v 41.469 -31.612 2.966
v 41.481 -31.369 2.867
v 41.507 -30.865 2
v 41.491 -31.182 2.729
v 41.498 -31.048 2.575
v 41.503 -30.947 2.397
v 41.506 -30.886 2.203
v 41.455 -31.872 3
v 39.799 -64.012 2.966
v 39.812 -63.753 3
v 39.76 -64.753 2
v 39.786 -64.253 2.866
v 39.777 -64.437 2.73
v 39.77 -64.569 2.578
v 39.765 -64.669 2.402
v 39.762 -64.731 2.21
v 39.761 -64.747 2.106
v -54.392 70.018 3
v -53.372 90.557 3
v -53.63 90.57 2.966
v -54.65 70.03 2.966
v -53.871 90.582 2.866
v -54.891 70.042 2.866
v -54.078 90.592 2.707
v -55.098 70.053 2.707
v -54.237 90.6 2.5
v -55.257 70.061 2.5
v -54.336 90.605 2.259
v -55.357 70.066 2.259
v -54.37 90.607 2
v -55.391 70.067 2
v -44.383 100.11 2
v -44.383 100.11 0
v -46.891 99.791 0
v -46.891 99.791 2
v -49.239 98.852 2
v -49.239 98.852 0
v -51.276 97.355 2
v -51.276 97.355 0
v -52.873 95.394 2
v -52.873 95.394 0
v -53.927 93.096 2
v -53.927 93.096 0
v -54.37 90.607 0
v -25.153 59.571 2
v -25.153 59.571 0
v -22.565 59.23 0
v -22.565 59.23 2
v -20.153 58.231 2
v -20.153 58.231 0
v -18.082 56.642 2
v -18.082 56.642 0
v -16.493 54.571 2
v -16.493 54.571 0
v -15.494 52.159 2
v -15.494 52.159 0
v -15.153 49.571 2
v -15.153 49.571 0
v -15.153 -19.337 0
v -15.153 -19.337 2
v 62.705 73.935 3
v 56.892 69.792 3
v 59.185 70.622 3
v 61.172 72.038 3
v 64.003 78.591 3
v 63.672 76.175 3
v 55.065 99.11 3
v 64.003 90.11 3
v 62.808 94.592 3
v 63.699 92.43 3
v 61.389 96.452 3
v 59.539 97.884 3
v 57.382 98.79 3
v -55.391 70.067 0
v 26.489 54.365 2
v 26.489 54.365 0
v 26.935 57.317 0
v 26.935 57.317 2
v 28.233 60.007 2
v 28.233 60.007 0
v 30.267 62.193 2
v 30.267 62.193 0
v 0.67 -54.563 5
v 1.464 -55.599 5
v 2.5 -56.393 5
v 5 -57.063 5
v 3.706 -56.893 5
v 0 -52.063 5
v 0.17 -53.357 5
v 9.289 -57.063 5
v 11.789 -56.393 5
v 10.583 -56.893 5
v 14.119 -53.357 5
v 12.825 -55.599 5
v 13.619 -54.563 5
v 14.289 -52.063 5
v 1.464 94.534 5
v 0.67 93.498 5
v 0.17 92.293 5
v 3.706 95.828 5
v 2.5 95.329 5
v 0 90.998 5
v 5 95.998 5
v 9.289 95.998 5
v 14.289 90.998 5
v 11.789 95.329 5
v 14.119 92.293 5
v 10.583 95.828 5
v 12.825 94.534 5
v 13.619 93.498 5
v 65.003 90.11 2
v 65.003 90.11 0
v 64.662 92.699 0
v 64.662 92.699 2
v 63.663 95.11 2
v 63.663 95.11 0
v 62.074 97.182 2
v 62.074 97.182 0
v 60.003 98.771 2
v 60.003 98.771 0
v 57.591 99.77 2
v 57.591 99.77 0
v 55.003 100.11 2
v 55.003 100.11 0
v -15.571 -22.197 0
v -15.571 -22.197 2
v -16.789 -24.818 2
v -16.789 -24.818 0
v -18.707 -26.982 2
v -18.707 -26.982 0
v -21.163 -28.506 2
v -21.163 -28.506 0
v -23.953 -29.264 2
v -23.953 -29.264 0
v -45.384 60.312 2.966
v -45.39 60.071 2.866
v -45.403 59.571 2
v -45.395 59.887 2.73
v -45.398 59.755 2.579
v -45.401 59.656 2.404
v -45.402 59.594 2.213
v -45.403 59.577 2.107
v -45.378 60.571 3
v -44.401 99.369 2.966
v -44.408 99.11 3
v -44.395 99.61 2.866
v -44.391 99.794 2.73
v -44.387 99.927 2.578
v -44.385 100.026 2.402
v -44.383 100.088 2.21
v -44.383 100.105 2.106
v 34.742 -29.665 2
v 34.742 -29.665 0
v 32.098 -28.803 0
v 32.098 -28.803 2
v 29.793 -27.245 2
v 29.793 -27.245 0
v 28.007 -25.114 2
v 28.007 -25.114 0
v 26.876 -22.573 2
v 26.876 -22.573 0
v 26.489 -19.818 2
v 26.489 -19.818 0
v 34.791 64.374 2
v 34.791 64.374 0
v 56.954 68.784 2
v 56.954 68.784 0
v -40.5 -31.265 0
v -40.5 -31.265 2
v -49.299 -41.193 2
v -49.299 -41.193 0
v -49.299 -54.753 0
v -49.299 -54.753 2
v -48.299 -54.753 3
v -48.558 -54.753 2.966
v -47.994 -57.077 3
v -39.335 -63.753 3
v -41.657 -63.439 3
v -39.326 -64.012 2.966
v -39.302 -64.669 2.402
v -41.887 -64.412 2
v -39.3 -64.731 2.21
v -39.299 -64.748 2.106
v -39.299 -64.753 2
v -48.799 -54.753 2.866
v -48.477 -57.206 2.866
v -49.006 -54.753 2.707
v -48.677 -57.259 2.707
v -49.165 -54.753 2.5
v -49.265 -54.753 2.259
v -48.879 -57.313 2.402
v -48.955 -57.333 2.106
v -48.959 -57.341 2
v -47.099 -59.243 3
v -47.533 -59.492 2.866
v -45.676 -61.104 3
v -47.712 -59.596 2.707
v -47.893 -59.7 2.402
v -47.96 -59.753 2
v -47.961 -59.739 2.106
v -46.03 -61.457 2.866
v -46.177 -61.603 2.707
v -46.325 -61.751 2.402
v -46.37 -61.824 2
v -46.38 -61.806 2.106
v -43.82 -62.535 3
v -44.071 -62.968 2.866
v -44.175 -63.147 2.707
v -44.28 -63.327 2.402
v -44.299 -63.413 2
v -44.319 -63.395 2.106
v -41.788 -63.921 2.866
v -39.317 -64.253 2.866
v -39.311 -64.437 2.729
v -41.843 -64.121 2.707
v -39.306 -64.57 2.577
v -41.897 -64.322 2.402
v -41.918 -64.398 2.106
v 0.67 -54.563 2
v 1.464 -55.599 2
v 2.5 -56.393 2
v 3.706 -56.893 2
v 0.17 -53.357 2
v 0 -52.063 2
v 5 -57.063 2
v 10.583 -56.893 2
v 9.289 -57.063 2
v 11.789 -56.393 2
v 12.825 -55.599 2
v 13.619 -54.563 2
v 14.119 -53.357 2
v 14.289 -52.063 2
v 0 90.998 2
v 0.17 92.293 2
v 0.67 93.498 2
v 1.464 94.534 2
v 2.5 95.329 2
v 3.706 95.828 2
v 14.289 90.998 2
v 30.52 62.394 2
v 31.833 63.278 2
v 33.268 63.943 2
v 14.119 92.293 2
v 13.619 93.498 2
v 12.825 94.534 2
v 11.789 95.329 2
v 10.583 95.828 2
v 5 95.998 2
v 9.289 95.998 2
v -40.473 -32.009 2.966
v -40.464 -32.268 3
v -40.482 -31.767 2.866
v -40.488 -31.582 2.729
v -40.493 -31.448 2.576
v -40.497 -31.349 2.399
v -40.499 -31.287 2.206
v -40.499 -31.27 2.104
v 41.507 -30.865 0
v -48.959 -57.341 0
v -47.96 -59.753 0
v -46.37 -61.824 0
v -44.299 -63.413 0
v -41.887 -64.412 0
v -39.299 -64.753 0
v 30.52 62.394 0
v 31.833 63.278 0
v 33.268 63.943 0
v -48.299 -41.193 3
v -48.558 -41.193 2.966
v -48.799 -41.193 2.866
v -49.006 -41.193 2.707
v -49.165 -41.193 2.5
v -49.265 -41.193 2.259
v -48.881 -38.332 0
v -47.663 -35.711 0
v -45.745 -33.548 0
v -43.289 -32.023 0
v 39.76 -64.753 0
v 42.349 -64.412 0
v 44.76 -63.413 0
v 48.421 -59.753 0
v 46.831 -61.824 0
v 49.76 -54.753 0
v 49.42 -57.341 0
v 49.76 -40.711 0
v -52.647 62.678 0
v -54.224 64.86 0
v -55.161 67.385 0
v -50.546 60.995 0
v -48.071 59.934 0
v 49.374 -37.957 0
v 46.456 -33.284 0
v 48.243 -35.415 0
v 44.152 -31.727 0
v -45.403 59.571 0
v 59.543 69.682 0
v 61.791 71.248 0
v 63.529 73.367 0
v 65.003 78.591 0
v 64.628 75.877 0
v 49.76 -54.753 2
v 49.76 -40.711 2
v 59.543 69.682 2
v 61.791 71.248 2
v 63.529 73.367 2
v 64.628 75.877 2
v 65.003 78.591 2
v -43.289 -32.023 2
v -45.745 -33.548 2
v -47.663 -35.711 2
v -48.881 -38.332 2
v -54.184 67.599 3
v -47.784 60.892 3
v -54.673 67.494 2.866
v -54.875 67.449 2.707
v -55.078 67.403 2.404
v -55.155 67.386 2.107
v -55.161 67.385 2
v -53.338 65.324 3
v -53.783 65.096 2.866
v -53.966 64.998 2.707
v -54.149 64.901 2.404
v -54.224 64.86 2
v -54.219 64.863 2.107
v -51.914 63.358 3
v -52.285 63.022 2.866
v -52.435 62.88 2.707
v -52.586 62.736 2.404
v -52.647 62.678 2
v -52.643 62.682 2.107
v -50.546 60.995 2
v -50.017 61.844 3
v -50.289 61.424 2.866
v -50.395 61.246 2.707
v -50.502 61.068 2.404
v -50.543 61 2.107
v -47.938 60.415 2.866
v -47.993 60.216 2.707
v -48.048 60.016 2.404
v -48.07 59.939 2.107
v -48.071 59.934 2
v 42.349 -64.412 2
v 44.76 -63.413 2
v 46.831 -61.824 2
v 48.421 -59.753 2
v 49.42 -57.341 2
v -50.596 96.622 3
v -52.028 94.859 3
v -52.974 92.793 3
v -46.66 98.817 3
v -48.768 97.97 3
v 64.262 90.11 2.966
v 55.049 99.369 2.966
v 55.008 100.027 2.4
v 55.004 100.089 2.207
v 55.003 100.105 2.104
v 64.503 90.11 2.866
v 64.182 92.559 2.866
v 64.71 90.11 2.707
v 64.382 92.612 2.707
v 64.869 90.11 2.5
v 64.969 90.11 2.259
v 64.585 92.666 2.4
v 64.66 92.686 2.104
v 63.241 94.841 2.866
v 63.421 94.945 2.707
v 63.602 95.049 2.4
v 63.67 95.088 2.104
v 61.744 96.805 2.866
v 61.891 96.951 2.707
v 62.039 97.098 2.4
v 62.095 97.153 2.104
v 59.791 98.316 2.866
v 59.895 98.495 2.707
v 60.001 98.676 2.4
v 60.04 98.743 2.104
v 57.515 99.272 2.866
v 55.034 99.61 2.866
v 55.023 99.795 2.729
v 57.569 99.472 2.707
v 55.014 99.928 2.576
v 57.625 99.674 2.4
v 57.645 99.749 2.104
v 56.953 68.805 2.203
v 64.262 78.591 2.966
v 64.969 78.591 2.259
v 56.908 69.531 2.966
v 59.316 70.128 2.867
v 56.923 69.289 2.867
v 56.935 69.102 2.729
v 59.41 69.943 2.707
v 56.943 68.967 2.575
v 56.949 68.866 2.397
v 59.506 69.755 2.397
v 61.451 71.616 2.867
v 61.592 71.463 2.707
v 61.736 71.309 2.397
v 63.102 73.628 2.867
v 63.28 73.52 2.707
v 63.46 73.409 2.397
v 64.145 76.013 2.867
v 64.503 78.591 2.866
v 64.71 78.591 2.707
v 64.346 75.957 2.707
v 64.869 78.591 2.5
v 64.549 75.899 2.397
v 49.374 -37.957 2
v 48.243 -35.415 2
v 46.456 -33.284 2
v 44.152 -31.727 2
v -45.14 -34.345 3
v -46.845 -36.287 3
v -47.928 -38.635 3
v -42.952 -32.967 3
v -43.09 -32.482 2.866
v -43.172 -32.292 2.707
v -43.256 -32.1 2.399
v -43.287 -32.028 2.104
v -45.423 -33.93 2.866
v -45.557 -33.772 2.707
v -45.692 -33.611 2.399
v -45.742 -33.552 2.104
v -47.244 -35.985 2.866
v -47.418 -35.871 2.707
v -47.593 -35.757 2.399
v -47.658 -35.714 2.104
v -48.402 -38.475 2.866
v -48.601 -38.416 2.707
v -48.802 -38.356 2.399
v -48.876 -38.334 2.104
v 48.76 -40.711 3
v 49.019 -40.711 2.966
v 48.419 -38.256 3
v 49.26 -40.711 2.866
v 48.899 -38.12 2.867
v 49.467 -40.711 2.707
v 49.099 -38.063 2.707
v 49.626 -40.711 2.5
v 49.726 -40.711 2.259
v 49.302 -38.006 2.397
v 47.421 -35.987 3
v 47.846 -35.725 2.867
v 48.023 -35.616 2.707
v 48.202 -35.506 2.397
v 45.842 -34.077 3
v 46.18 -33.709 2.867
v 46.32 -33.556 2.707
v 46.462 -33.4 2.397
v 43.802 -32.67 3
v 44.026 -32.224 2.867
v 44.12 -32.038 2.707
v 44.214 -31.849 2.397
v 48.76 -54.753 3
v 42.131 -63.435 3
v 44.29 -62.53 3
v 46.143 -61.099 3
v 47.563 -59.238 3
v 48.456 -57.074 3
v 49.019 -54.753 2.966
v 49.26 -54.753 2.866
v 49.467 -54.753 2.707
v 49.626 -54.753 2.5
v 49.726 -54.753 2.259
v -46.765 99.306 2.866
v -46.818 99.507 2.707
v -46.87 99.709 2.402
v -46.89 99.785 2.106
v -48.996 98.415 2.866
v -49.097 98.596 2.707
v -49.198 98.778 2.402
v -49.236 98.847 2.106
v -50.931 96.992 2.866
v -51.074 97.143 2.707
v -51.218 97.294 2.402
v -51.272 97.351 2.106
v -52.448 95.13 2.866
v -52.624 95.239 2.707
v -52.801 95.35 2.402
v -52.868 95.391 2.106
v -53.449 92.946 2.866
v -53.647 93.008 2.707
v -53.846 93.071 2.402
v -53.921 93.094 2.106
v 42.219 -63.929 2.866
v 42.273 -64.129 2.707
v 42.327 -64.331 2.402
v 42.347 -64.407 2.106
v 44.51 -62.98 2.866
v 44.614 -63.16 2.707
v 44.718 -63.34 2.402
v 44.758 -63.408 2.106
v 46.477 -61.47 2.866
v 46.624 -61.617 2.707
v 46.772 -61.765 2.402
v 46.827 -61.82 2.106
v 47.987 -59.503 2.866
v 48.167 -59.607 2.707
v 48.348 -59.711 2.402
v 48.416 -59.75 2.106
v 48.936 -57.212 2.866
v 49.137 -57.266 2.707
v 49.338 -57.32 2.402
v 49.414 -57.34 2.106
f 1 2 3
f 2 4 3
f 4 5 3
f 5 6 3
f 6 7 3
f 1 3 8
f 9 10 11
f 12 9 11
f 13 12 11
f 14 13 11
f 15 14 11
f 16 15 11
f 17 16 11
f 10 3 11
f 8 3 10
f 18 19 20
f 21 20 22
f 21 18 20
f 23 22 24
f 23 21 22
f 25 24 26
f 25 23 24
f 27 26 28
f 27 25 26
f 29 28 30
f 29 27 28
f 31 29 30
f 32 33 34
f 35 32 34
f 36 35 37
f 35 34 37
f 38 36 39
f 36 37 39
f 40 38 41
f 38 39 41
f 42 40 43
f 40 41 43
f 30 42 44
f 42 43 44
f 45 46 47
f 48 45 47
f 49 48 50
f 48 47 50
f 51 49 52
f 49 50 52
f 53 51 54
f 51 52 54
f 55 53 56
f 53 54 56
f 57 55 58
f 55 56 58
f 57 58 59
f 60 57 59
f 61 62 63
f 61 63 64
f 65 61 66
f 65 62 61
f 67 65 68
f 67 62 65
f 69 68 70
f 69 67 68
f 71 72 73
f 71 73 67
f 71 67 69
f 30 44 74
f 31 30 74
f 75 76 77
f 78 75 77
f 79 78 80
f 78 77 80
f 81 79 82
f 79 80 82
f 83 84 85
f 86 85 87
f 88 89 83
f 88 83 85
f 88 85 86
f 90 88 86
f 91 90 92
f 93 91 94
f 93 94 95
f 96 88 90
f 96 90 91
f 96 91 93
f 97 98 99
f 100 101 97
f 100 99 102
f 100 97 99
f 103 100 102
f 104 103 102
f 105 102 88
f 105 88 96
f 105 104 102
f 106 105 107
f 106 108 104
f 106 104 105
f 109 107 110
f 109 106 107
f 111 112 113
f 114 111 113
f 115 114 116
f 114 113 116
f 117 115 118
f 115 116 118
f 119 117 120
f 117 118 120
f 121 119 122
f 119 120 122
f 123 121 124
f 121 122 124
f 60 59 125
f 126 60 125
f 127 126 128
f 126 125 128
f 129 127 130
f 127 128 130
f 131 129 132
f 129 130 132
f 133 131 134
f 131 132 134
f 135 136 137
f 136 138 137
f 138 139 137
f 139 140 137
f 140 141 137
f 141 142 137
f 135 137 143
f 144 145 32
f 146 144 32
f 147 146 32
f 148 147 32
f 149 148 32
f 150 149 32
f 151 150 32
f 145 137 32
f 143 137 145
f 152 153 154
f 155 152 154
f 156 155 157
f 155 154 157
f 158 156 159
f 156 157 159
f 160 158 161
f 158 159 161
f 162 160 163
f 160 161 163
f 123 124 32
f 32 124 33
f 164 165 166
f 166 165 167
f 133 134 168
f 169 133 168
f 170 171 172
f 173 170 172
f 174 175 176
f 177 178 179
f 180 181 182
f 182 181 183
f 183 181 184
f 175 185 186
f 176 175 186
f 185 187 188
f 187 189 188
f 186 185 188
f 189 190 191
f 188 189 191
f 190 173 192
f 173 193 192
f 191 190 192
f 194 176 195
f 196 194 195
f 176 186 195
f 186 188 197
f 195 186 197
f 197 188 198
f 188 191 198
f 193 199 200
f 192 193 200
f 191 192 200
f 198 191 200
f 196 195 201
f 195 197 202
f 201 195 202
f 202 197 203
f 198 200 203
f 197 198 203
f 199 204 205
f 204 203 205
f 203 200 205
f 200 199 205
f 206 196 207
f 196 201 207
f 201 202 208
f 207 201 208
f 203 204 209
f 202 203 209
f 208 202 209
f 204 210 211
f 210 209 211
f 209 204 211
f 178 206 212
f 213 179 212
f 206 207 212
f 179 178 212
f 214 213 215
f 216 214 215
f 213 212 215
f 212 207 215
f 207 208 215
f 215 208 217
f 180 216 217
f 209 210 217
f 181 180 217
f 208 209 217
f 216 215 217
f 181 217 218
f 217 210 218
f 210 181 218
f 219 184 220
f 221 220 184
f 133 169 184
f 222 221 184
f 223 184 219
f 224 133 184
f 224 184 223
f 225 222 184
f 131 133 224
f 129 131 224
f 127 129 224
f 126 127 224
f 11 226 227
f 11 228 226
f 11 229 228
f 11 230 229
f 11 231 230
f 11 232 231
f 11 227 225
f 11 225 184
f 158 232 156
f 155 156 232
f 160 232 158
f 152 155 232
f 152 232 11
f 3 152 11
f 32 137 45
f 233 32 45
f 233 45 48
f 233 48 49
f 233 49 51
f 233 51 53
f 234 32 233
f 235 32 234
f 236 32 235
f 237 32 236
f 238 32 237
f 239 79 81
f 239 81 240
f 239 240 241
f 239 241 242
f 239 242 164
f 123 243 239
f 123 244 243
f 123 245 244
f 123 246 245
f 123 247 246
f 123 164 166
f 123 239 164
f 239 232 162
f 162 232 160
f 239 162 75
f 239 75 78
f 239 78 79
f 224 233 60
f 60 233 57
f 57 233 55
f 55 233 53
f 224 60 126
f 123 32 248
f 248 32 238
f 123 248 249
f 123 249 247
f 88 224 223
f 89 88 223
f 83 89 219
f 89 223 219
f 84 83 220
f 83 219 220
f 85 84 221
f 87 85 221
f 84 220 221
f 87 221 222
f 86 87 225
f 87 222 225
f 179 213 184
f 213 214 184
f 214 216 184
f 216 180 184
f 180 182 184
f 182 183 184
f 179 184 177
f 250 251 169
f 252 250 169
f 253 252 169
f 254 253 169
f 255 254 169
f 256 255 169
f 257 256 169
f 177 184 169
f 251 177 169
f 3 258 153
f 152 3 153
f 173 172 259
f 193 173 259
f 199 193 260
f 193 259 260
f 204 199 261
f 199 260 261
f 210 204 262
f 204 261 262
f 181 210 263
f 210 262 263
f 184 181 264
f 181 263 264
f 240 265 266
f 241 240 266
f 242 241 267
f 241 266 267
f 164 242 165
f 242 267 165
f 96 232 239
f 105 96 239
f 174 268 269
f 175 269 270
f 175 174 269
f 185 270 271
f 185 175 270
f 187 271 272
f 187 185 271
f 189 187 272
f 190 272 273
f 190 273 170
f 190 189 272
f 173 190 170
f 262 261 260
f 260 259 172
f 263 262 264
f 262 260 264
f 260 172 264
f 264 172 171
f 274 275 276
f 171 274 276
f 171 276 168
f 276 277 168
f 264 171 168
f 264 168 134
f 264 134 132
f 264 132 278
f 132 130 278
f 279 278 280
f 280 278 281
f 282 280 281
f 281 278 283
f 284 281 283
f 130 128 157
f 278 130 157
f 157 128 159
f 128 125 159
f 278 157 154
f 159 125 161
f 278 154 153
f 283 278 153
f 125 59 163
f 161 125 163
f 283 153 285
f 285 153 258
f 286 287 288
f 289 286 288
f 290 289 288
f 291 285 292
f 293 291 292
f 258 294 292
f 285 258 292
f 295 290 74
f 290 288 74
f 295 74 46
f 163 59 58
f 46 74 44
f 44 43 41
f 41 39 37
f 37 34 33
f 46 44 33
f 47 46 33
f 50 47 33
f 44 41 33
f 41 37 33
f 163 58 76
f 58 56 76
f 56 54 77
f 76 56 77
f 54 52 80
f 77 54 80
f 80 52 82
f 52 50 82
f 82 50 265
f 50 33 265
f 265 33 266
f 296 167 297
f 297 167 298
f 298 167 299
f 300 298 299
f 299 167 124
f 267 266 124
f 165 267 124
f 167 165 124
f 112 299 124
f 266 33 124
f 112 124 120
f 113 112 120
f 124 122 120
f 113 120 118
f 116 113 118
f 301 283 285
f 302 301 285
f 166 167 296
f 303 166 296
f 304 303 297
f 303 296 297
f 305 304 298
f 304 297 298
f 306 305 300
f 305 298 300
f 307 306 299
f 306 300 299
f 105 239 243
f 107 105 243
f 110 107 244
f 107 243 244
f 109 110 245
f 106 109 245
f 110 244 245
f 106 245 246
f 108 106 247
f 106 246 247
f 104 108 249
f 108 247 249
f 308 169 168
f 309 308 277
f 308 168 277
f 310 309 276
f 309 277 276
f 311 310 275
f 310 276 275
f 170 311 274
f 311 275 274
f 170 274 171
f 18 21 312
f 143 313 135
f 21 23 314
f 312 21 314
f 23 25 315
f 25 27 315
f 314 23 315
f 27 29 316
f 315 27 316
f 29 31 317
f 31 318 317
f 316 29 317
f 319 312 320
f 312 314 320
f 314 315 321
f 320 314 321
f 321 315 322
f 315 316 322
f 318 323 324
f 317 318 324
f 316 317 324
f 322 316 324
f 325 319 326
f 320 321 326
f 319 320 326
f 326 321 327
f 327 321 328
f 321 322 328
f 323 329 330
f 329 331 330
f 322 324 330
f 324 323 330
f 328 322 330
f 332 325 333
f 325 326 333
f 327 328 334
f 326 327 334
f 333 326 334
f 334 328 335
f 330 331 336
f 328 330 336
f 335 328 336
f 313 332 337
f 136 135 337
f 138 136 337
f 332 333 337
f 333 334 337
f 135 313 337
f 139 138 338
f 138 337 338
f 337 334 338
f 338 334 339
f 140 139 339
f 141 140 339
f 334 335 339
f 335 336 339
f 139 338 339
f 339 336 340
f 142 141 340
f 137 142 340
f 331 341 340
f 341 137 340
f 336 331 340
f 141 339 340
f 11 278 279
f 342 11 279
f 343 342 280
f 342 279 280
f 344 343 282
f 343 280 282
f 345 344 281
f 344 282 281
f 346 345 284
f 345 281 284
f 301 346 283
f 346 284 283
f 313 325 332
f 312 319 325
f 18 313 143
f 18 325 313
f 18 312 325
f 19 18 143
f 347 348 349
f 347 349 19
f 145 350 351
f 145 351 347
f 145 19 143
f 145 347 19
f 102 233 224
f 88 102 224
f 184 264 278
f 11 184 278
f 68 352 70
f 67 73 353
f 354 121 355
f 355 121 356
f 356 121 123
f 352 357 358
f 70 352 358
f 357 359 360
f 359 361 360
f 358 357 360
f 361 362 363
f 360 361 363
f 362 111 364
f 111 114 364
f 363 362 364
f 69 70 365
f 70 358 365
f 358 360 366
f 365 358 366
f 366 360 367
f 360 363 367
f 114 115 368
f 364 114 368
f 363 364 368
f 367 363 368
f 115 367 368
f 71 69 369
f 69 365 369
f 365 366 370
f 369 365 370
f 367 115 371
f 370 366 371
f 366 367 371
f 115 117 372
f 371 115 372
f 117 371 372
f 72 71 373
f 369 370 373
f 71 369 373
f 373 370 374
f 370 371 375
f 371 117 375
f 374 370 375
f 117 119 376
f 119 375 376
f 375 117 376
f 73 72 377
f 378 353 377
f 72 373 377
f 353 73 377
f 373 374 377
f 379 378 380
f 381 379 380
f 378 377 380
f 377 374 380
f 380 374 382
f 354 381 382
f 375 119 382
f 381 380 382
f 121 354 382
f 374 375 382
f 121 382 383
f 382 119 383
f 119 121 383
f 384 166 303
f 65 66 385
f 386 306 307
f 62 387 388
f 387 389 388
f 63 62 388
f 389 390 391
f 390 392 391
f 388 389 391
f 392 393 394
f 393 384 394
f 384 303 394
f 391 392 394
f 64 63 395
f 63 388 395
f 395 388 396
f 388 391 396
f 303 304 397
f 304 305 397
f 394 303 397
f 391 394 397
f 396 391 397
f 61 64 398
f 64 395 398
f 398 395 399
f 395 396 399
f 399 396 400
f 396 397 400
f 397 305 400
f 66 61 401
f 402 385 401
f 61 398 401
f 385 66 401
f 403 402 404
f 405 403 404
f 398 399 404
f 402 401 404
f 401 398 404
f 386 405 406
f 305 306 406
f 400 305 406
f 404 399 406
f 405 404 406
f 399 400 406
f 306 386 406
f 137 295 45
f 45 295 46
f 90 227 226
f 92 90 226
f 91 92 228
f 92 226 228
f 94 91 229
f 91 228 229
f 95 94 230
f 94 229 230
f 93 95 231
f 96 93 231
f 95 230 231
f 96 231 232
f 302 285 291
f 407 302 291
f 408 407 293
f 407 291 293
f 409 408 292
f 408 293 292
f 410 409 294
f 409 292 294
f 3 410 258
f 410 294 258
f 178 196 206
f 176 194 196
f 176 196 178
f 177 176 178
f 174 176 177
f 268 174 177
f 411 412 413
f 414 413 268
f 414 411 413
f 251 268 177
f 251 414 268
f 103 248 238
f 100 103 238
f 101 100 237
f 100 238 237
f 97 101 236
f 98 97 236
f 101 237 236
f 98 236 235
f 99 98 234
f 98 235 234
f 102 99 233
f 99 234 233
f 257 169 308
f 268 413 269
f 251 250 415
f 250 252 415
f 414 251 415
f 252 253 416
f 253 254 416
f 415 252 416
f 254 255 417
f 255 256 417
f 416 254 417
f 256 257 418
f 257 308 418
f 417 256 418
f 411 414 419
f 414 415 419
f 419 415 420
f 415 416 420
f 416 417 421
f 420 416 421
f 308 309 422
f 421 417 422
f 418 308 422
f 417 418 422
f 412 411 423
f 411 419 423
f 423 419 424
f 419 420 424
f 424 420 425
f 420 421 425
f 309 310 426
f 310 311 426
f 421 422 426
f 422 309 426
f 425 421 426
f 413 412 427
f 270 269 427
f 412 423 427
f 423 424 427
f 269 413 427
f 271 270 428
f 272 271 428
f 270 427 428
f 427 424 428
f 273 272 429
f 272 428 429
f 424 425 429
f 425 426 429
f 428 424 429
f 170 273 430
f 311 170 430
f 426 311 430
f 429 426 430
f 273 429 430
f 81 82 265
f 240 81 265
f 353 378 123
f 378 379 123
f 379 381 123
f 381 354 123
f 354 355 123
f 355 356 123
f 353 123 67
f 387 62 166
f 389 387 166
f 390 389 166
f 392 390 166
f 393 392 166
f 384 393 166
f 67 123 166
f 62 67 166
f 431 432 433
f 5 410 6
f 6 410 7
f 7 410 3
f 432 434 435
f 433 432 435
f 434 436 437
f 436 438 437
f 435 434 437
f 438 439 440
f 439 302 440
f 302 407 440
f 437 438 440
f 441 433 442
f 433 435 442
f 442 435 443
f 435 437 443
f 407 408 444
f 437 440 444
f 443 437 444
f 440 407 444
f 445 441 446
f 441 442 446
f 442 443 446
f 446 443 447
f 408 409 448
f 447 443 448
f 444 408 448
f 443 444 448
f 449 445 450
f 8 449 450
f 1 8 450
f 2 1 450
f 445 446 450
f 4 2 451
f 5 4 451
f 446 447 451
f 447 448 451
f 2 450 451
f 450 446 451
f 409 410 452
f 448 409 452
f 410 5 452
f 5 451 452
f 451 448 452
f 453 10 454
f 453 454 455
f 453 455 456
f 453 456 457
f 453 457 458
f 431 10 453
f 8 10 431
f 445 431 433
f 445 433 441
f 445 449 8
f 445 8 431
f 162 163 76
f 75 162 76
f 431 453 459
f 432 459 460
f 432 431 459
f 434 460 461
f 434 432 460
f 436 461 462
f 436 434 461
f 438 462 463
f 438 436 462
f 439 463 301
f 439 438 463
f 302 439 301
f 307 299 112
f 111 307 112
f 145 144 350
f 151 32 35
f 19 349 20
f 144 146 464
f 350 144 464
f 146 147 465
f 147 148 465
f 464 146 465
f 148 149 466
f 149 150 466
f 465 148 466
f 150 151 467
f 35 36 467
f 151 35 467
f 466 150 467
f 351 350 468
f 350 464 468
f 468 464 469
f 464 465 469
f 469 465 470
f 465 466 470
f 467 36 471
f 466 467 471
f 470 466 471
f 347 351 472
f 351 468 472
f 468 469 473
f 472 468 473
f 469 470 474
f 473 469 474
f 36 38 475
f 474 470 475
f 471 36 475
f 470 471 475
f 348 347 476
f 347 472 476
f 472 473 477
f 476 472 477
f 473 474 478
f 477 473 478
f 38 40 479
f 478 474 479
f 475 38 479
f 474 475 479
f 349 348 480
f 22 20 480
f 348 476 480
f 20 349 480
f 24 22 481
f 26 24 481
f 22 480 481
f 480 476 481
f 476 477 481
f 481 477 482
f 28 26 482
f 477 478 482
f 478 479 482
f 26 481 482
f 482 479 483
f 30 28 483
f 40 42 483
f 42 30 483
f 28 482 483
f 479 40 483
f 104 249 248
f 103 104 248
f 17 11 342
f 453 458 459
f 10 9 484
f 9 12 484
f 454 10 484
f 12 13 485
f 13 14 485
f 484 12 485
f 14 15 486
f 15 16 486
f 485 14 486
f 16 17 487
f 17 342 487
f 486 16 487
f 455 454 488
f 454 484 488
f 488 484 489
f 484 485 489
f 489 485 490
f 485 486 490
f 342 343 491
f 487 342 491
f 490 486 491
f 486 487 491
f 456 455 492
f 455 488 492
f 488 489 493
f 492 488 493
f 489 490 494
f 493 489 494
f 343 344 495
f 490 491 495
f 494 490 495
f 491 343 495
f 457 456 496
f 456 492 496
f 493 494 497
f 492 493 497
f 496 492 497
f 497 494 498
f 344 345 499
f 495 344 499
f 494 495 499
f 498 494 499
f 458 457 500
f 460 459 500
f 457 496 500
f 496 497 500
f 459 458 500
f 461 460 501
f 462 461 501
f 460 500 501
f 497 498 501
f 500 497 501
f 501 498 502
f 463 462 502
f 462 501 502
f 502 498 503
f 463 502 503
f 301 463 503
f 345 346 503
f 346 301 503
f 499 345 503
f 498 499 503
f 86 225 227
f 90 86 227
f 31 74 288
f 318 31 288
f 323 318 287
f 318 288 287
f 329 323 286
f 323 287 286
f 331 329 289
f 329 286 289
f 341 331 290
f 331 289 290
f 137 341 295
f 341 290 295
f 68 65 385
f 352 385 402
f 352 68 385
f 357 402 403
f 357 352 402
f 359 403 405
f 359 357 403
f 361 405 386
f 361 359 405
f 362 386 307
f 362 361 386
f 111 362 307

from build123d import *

# Parameters (mm, degrees)
F1_DEPTH = 2
F3_DEPTH = 3
F5_DEPTH = 1
F6_R     = 1


with BuildPart() as f1:
    # F0 (on Top) → F1 (new body)
    with BuildSketch(Plane.XY):
        with BuildLine():
            Line((55.00297, 100.110456), (-44.382804, 100.110456))
            ThreePointArc((-44.382804, 100.110456), (-51.276236, 97.354806), (-54.37049, 90.606577))
            Line((-54.37049, 90.606577), (-55.390746, 70.067208))
            ThreePointArc((-55.390746, 70.067208), (-52.64741, 62.677656), (-45.40306, 59.571087))
            Line((-45.40306, 59.571087), (-25.153022, 59.571087))
            ThreePointArc((-25.153022, 59.571087), (-18.081955, 56.642155), (-15.153022, 49.571087))
            Line((-15.153022, 49.571087), (-15.153022, -19.336576))
            ThreePointArc((-15.153022, -19.336576), (-17.669577, -25.969679), (-23.952632, -29.264268))
            Line((-23.952632, -29.264268), (-40.499641, -31.265022))
            ThreePointArc((-40.499641, -31.265022), (-46.782696, -34.559611), (-49.299251, -41.192713))
            Line((-49.299251, -41.192713), (-49.299251, -54.753145))
            ThreePointArc((-49.299251, -54.753145), (-46.370319, -61.824213), (-39.299251, -64.753145))
            Line((-39.299251, -64.753145), (39.760375, -64.753145))
            ThreePointArc((39.760375, -64.753145), (46.831443, -61.824213), (49.760375, -54.753145))
            Line((49.760375, -54.753145), (49.760375, -40.710986))
            ThreePointArc((49.760375, -40.710986), (47.424223, -34.287168), (41.507289, -30.864753))
            Line((41.507289, -30.864753), (34.742437, -29.664537))
            ThreePointArc((34.742437, -29.664537), (28.825503, -26.242122), (26.489351, -19.818304))
            Line((26.489351, -19.818304), (26.489351, 54.364799))
            ThreePointArc((26.489351, 54.364799), (27.48312, 58.710809), (30.26691, 62.193032))
            Line((30.26691, 62.193032), (30.519926, 62.394148))
            ThreePointArc((30.519926, 62.394148), (32.537261, 63.638791), (34.790872, 64.37365))
            Line((34.790872, 64.37365), (56.954466, 68.783654))
            ThreePointArc((56.954466, 68.783654), (62.733266, 72.247689), (65.00297, 78.591389))
            Line((65.00297, 78.591389), (65.00297, 90.110456))
            ThreePointArc((65.00297, 90.110456), (62.074038, 97.181524), (55.00297, 100.110456))
        make_face()
    extrude(amount=F1_DEPTH)

    # F2 (on face) → F3 (join)
    with BuildSketch(Plane.XY.offset(2)):
        with BuildLine():
            ThreePointArc((5, 95.998436), (1.464466, 94.53397), (0, 90.998436))
            Line((0, 90.998436), (0, -52.06298))
            ThreePointArc((0, -52.06298), (1.464466, -55.598514), (5, -57.06298))
            Line((5, -57.06298), (9.289023, -57.06298))
            ThreePointArc((9.289023, -57.06298), (12.824557, -55.598514), (14.289023, -52.06298))
            Line((14.289023, -52.06298), (14.289023, 90.998436))
            ThreePointArc((14.289023, 90.998436), (12.824557, 94.53397), (9.289023, 95.998436))
            Line((9.289023, 95.998436), (5, 95.998436))
        make_face()
    extrude(amount=F3_DEPTH)

    # F4 (on face) → F5 (join)
    with BuildSketch(Plane.XY.offset(2)):
        with BuildLine():
            Line((-39.299251, -64.753145), (-40.499641, -31.265022))
            ThreePointArc((-40.499641, -31.265022), (-46.782696, -34.559611), (-49.299251, -41.192713))
            Line((-49.299251, -41.192713), (-49.299251, -54.753145))
            ThreePointArc((-49.299251, -54.753145), (-46.370319, -61.824213), (-39.299251, -64.753145))
        make_face()
        with BuildLine():
            Line((41.507289, -30.864753), (39.760375, -64.753145))
            ThreePointArc((39.760375, -64.753145), (46.831443, -61.824213), (49.760375, -54.753145))
            Line((49.760375, -54.753145), (49.760375, -40.710986))
            ThreePointArc((49.760375, -40.710986), (47.424223, -34.287168), (41.507289, -30.864753))
        make_face()
        with BuildLine():
            Line((-45.40306, 59.571087), (-44.382804, 100.110456))
            ThreePointArc((-44.382804, 100.110456), (-51.276236, 97.354806), (-54.37049, 90.606577))
            Line((-54.37049, 90.606577), (-55.390746, 70.067208))
            ThreePointArc((-55.390746, 70.067208), (-52.64741, 62.677656), (-45.40306, 59.571087))
        make_face()
        with BuildLine():
            ThreePointArc((65.00297, 90.110456), (62.074038, 97.181524), (55.00297, 100.110456))
            Line((55.00297, 100.110456), (56.954466, 68.783654))
            ThreePointArc((56.954466, 68.783654), (62.733266, 72.247689), (65.00297, 78.591389))
            Line((65.00297, 78.591389), (65.00297, 90.110456))
        make_face()
    extrude(amount=F5_DEPTH)

    # F6
    f6_edges = [f1.edges().sort_by_distance(p)[0] for p in [
        (46.831443, -61.824213, 3),
        (49.760375, -47.732065, 3),
        (47.424223, -34.287168, 3),
        (-49.299251, -47.972929, 3),
        (-46.782696, -34.559611, 3),
        (-54.880618, 80.336892, 3),
        (65.00297, 84.350923, 3),
    ]]
    fillet(f6_edges, radius=F6_R)


solid = f1.part
